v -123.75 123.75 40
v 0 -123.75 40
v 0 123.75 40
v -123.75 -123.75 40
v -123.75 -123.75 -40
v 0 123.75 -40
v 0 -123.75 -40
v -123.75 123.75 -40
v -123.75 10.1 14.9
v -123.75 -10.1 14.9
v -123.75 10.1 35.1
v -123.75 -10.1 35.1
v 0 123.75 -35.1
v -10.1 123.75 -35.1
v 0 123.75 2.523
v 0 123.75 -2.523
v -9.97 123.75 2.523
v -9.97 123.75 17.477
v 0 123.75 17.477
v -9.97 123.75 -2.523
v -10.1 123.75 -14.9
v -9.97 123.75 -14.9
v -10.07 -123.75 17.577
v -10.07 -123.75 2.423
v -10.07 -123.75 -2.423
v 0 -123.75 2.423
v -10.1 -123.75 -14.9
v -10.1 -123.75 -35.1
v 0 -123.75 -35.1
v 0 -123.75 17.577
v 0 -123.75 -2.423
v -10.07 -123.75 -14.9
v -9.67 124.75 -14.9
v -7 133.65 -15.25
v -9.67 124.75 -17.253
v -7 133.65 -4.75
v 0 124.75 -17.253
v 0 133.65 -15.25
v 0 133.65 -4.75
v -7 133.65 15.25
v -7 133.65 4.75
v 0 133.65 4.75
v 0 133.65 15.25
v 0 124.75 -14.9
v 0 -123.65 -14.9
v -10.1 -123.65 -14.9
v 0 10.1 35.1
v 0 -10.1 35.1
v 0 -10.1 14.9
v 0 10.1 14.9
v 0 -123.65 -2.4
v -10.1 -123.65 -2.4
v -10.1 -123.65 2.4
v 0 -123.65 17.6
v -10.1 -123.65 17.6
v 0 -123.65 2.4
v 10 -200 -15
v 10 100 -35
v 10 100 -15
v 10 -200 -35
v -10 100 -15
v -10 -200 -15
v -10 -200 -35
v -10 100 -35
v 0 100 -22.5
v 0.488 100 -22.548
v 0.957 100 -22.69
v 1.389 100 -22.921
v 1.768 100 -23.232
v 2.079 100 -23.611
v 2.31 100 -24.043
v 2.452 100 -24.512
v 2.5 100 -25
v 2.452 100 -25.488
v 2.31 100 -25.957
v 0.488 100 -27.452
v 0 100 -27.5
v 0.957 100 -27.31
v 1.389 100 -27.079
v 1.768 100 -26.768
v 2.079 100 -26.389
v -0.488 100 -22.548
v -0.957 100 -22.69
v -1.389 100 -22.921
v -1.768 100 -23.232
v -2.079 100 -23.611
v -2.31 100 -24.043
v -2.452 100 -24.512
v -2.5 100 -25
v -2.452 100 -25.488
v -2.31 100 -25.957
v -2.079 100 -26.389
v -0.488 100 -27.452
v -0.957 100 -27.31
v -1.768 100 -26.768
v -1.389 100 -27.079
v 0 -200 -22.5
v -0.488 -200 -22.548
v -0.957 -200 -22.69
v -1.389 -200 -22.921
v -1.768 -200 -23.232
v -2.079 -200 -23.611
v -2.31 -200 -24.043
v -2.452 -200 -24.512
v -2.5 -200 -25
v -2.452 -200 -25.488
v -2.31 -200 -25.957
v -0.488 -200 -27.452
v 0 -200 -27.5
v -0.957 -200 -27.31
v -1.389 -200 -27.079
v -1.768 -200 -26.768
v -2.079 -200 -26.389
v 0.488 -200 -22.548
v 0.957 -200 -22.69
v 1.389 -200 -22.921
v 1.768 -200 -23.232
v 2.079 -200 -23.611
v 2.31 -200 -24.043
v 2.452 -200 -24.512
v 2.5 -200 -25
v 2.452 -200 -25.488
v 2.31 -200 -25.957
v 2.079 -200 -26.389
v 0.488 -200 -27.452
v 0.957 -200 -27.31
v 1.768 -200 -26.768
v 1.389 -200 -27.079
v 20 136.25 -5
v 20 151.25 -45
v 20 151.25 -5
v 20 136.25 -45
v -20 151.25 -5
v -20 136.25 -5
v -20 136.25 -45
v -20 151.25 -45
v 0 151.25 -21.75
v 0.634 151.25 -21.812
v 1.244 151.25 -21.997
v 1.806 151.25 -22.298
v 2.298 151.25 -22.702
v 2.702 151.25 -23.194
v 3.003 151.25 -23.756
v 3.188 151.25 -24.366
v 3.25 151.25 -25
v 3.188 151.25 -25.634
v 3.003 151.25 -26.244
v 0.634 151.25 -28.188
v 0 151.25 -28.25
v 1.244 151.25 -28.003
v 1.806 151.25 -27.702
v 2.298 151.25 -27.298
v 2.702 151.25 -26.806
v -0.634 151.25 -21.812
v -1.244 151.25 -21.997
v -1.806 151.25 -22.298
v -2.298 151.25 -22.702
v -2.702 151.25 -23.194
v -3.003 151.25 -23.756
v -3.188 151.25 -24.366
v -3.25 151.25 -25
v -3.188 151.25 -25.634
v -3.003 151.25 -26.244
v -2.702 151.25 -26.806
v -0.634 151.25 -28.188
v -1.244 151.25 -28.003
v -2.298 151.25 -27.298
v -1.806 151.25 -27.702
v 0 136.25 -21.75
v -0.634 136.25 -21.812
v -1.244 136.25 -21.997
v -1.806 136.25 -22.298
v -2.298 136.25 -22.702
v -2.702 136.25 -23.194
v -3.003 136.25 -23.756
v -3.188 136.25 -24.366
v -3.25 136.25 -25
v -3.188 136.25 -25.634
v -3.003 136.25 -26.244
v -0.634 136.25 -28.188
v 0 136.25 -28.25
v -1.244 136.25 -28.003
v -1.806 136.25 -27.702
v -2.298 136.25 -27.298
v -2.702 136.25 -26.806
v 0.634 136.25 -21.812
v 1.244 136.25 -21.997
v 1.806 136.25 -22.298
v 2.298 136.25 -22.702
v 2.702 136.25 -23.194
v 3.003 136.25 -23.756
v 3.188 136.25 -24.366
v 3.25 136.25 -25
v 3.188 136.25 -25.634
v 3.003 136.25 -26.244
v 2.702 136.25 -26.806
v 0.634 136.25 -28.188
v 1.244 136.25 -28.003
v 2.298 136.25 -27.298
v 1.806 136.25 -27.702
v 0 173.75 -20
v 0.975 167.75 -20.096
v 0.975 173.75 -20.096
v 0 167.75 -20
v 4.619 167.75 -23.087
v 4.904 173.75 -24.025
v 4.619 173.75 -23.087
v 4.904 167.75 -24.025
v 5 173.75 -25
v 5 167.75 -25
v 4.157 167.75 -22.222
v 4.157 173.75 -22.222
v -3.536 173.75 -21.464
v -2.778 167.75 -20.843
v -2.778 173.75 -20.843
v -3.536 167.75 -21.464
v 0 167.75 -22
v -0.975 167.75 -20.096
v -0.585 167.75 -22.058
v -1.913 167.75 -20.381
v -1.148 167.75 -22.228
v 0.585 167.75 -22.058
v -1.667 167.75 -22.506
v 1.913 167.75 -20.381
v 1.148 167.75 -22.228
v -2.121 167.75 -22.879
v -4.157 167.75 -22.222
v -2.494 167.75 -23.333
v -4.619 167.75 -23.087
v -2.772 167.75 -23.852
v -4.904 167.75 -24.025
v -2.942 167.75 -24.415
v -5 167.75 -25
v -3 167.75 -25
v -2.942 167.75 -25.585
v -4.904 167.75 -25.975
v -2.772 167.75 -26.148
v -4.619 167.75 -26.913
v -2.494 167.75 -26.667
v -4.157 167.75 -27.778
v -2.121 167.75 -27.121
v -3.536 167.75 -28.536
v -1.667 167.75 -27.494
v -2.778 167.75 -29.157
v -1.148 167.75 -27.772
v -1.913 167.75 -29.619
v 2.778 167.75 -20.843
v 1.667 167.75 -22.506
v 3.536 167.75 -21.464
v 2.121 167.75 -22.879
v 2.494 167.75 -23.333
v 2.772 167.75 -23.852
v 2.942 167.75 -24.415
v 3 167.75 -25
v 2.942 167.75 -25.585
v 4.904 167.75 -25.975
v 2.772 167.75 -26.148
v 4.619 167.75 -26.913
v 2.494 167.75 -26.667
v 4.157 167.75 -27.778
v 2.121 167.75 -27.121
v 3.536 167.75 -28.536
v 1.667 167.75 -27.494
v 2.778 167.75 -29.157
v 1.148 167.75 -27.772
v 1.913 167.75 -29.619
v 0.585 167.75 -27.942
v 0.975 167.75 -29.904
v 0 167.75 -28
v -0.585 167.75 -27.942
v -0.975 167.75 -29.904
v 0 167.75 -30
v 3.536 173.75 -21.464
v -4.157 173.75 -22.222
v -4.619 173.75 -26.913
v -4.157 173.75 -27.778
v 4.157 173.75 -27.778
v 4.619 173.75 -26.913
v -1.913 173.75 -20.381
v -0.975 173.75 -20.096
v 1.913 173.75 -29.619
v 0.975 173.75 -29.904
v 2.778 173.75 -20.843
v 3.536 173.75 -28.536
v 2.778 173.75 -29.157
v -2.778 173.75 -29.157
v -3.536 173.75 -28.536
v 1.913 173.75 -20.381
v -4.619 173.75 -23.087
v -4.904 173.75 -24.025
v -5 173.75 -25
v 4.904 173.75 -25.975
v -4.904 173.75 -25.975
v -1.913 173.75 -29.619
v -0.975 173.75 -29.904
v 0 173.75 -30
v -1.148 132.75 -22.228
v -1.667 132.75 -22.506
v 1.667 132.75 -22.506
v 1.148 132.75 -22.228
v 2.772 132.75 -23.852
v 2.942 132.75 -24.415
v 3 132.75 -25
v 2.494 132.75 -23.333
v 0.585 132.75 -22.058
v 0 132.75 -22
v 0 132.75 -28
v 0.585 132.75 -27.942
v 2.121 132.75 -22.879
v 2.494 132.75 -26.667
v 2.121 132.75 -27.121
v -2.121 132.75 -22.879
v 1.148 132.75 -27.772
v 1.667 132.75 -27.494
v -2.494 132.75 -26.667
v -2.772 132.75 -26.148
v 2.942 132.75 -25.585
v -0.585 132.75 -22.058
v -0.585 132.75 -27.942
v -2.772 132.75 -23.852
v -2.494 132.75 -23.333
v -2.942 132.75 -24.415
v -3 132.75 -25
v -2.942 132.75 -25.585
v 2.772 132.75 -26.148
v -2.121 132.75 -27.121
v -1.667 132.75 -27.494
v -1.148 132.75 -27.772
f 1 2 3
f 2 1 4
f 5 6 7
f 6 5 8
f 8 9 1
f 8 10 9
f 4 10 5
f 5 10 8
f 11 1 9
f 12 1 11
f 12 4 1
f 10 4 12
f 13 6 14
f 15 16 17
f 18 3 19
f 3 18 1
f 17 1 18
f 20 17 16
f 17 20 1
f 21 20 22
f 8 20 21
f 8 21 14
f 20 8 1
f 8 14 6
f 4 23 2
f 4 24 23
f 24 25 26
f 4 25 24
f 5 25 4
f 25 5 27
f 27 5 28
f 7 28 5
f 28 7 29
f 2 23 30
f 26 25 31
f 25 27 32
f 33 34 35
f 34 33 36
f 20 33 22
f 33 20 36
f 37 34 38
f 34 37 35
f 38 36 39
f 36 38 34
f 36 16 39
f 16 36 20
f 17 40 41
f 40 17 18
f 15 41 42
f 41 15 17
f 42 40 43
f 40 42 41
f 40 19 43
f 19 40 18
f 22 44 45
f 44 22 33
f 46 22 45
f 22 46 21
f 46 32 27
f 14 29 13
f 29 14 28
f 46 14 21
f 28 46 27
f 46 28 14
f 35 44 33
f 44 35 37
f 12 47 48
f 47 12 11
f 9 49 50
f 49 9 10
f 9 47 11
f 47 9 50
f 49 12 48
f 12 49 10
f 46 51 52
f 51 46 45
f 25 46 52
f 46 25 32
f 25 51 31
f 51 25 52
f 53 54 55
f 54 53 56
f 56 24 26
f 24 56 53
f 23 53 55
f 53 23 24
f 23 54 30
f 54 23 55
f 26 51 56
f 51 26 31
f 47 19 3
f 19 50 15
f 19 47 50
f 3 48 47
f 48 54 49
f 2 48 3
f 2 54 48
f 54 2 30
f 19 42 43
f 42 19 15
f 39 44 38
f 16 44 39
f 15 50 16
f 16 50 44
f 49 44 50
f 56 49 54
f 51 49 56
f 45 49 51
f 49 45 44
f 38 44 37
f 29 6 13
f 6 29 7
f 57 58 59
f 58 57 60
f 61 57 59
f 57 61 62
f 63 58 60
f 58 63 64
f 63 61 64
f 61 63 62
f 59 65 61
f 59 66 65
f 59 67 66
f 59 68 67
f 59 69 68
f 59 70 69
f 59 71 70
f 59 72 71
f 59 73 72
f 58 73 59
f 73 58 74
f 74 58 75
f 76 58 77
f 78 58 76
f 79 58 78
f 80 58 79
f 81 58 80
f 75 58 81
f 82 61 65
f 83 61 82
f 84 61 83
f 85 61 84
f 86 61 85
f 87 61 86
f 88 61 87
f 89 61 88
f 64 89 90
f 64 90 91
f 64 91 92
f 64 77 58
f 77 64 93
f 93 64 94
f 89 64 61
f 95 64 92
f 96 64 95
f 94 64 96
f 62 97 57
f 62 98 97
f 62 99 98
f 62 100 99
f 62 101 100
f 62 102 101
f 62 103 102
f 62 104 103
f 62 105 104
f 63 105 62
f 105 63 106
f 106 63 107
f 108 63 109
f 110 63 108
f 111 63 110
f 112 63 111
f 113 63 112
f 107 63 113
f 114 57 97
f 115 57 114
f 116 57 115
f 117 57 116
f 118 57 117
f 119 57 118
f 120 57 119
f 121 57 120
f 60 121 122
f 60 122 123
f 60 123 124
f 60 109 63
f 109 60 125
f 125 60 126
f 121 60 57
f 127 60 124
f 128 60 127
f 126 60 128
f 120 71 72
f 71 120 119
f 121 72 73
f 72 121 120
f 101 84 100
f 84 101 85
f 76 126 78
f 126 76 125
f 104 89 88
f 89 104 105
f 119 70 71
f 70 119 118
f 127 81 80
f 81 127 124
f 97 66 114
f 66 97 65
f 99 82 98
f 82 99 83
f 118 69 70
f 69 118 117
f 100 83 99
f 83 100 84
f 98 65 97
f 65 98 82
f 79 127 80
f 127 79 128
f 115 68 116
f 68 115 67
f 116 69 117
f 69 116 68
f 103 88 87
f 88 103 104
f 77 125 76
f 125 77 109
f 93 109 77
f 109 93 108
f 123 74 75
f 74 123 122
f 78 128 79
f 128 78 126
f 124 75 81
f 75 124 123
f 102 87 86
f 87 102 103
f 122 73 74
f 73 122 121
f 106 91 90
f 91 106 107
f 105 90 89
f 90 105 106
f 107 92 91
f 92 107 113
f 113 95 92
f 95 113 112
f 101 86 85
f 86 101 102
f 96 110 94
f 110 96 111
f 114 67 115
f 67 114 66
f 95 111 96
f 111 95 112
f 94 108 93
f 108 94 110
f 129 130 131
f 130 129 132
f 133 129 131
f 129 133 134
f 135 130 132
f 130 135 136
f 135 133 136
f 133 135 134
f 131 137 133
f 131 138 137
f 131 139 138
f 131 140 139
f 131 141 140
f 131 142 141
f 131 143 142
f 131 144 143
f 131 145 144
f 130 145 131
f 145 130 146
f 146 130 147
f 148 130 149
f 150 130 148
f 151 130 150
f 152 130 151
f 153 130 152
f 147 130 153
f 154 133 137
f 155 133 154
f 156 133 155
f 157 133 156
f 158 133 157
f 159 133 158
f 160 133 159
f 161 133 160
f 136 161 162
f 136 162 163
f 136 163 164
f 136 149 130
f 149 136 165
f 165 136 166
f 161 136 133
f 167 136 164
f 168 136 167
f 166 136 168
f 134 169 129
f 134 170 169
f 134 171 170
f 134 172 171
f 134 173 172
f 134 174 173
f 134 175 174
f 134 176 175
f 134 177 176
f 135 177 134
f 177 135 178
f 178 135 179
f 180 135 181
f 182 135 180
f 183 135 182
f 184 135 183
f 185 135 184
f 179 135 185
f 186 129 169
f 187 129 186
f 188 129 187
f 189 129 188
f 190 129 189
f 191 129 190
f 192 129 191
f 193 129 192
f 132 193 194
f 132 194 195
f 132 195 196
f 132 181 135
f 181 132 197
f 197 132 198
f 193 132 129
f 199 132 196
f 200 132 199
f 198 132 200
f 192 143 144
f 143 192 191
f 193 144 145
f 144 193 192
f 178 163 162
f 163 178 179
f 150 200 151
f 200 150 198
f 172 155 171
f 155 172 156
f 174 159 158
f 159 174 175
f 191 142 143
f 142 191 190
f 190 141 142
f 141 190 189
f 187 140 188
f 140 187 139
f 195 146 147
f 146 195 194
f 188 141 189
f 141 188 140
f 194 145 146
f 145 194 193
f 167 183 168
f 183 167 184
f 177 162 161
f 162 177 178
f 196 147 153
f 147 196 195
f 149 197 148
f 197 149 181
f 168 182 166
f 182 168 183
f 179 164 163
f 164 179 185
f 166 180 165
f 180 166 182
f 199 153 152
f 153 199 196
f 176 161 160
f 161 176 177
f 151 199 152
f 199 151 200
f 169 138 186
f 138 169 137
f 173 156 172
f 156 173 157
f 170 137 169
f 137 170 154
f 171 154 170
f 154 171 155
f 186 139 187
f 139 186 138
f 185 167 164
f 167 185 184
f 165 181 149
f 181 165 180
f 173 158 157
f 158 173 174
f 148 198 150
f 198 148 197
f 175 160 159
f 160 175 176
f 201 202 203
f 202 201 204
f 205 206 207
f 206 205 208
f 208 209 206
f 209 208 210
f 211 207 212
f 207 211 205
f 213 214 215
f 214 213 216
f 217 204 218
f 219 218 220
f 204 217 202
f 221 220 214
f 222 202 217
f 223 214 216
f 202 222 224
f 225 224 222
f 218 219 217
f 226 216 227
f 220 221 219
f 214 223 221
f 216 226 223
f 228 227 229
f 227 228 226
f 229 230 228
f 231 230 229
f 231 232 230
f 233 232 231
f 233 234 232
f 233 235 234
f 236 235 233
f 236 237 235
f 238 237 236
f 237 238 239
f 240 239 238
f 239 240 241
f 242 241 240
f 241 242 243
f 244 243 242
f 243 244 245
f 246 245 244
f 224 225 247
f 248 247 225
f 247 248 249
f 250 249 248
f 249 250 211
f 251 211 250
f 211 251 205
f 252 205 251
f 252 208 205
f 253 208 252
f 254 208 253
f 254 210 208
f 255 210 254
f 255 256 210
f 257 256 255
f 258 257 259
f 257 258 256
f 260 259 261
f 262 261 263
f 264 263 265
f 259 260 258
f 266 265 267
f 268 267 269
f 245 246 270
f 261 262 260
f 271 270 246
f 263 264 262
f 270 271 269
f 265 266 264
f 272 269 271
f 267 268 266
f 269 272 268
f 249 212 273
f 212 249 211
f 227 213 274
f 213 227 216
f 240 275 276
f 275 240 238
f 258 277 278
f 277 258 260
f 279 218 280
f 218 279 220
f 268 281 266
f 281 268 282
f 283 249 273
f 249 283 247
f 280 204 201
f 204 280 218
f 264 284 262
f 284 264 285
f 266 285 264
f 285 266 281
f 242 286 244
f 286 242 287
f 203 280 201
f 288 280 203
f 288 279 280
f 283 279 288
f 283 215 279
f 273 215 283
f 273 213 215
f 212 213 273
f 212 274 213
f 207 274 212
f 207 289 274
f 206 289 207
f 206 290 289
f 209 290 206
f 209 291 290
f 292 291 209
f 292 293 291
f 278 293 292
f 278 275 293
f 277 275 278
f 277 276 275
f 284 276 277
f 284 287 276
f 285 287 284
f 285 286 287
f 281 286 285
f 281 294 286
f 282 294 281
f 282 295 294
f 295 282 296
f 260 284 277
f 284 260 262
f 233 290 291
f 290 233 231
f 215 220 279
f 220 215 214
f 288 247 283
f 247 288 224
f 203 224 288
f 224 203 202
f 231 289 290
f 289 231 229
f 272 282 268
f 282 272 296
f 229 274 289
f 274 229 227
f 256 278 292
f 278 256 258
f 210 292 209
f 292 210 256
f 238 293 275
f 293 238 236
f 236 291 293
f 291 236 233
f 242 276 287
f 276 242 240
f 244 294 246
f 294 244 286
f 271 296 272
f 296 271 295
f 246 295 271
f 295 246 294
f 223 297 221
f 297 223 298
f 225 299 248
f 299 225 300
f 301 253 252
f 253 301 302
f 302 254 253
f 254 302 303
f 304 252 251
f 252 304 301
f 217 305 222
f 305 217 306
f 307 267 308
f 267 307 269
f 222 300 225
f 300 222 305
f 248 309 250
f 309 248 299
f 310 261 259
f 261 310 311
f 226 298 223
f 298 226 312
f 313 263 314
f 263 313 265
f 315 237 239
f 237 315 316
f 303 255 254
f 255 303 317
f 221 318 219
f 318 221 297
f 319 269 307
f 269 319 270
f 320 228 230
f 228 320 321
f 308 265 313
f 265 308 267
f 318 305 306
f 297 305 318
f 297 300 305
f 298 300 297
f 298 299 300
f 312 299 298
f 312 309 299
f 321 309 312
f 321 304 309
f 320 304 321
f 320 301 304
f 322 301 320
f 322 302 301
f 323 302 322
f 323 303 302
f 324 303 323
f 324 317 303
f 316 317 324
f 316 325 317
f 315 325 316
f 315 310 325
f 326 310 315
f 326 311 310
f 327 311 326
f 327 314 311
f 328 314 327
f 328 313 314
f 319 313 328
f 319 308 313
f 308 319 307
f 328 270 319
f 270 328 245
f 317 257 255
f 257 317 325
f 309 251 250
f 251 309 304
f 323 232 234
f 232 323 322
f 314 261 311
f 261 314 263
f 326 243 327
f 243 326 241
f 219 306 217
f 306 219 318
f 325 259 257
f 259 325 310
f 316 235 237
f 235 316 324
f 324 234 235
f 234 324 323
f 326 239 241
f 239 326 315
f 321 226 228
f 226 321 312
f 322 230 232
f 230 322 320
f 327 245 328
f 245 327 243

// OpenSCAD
// ====================================================================
// COMPOSITE TORSION BOX FOR LOWRIDER v4 - POLY-ALUMINUM 2020 MODULE
// Module: 247.5 x 247.5 x 80 mm | Profile: Motedis 2020 I-Typ Slot 5
// ====================================================================

mode = "detail"; // Options: "detail", "exploded", "assembled"
$fn = 32;

mod_size = 247.5;
mod_h = 80;
alu_size = 20;
alu_hole = 5;
gap = 0.2;

color_pla = [0.2, 0.5, 0.8, 0.75];
color_alu = [0.75, 0.75, 0.75, 1];
color_plate = [0.9, 0.2, 0.2, 1];
color_steel = [0.3, 0.3, 0.3, 1];

module printed_module() {
    color(color_pla)
    difference() {
        union() {
            cube([mod_size, mod_size, mod_h], center=true);
            translate([0, mod_size/2, -10]) pin();
            translate([0, mod_size/2, 10]) pin();
        }
        translate([0, 0, -25]) cube([alu_size + gap, mod_size + 2, alu_size + gap], center=true);
        translate([0, 0, 25]) cube([mod_size + 2, alu_size + gap, alu_size + gap], center=true);
        translate([0, -mod_size/2, -10]) rotate([0, 0, 180]) pin(hole=true);
        translate([0, -mod_size/2, 10]) rotate([0, 0, 180]) pin(hole=true);
    }
}

module pin(hole=false) {
    t = hole ? 0.2 : 0;
    rotate([-90, 0, 0]) translate([0, 0, -0.1])
    linear_extrude(height=10, scale=0.7) square([20 + t, 15 + t], center=true);
}

module alu_profile(length) {
    color(color_alu)
    difference() {
        cube([alu_size, length, alu_size], center=true);
        rotate([90, 0, 0]) cylinder(d=alu_hole, h=length + 2, center=true);
    }
}

module end_plate() {
    color(color_plate)
    difference() {
        cube([40, 15, 40], center=true);
        rotate([90, 0, 0]) cylinder(d=6.5, h=15, center=true);
    }
}

module screw_m6() {
    color(color_steel)
    rotate([90, 0, 0]) {
        cylinder(d=10, h=6);
        translate([0, 0, 6]) cylinder(d=6, h=35);
    }
}

if (mode == "detail") {
    difference() {
        printed_module();
        translate([0, -mod_size, -mod_h]) cube([mod_size*2, mod_size*2, mod_h*2]);
    }
    translate([0, -50, -25]) alu_profile(length=300);
    translate([0, mod_size/2 + 20, -25]) end_plate();
    translate([0, mod_size/2 + 50, -25]) screw_m6();
} else if (mode == "exploded") {
    offset = 60;
    translate([0, 0, -25]) alu_profile(length=800);
    translate([0, -mod_size - offset, 0]) printed_module();
    printed_module();
    translate([0, mod_size + offset, 0]) printed_module();
    translate([0, (mod_size*1.5) + offset + 20, -25]) end_plate();
    translate([0, (mod_size*1.5) + offset + 40, -25]) screw_m6();
} else if (mode == "assembled") {
    translate([0, 0, -25]) alu_profile(length=mod_size * 3);
    translate([0, -mod_size, 0]) printed_module();
    printed_module();
    translate([0, mod_size, 0]) printed_module();
    translate([0, (mod_size*1.5) + 6, -25]) end_plate();
    translate([0, (mod_size*1.5) + 12, -25]) screw_m6();
}
